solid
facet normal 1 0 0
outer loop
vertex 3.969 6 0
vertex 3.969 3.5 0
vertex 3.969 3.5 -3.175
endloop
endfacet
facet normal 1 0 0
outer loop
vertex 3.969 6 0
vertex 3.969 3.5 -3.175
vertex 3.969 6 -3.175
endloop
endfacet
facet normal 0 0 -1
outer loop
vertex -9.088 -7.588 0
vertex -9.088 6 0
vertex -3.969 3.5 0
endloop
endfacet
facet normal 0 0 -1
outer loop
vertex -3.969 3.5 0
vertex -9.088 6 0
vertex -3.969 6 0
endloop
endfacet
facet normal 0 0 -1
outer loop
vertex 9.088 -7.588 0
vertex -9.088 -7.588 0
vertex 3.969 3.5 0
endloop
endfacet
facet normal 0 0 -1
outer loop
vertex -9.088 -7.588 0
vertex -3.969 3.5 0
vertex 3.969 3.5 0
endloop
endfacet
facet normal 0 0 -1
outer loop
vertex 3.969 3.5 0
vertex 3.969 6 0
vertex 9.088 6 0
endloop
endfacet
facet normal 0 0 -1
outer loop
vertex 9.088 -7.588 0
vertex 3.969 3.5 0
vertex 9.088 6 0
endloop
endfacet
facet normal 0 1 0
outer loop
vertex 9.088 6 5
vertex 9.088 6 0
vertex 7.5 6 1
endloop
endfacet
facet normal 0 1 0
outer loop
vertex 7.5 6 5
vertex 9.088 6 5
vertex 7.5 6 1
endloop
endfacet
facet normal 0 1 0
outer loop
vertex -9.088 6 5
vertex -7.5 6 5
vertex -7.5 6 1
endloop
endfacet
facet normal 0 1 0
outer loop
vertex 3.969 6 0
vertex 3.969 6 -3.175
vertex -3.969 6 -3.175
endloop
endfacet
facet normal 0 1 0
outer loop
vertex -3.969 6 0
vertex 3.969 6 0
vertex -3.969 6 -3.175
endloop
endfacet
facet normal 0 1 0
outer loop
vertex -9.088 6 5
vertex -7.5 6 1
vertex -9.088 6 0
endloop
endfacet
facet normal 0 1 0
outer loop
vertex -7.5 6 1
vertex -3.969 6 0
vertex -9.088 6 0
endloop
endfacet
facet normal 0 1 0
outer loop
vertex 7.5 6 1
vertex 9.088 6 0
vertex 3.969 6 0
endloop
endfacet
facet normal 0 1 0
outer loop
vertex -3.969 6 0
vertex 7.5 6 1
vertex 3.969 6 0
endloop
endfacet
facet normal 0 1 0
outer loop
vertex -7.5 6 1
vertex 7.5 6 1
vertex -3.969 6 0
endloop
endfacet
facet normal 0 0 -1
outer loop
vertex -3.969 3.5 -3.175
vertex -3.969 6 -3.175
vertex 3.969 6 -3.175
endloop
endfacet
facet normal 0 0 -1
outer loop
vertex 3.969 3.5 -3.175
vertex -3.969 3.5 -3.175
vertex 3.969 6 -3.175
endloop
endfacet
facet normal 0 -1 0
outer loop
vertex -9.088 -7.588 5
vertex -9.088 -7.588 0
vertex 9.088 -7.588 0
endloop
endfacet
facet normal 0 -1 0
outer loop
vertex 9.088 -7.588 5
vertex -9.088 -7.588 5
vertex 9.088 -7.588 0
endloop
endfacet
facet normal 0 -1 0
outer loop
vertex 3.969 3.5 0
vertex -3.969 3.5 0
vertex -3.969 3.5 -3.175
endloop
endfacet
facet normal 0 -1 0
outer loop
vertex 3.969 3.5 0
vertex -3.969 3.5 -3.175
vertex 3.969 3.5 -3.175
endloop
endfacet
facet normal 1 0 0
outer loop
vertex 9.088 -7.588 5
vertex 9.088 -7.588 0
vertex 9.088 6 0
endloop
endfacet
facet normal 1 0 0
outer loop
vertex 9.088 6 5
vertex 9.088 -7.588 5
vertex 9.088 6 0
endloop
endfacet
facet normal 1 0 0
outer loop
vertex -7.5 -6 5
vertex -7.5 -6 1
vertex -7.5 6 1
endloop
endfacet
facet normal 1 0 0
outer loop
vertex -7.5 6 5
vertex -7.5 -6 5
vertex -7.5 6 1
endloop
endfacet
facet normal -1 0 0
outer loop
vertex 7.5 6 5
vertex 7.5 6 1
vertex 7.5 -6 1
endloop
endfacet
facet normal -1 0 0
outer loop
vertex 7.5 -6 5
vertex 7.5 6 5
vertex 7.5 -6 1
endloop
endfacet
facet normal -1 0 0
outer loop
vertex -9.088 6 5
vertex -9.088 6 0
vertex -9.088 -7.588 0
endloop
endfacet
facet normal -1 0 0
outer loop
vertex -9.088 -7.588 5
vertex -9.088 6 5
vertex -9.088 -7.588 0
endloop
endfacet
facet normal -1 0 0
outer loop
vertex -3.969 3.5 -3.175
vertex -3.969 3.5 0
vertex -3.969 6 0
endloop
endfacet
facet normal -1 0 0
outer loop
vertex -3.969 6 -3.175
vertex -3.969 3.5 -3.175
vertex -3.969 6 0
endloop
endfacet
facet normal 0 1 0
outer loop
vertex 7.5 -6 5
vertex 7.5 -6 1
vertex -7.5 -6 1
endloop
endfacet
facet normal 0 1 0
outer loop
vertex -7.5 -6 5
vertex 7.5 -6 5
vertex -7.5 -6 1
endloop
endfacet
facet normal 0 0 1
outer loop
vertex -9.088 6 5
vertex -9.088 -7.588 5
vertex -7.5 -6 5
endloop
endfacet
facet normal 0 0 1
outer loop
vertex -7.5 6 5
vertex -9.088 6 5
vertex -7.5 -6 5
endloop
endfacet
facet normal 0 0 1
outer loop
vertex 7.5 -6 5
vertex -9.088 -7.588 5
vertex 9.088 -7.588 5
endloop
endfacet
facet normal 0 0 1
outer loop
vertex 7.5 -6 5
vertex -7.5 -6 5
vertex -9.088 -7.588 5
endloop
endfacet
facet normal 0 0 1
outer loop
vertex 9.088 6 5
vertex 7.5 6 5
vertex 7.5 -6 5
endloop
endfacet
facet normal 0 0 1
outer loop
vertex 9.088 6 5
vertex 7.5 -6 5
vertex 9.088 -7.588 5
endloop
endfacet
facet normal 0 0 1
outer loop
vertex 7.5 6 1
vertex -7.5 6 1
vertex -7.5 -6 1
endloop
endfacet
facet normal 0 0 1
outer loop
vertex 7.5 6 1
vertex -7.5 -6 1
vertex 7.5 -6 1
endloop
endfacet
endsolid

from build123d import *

# Parameters (mm, degrees)
F1_DEPTH = 5
F0_W     = 7.9375
F0_H     = 2.5
F2_DEPTH = 1
F3_DEPTH = 3.175


with BuildPart() as f1:
    # F0 (on Top) → F1 (new body)
    with BuildSketch(Plane.XY):
        Polygon((7.5, 6), (7.5, -6), (7.5, -7.5875), (9.0875, -7.5875), (9.0875, 6), align=None)
        Polygon((7.5, -7.5875), (7.5, -6), (4.5, -6), (-7.5, -6), (-7.5, -7.5875), align=None)
        Polygon((-7.5, -7.5875), (-7.5, -6), (-7.5, 4.4125), (-7.5, 6), (-7.5875, 6), (-9.0875, 6), (-9.0875, -7.5875), align=None)
    extrude(amount=F1_DEPTH)

    # F0 (on Top) → F2 (join)
    with BuildSketch(Plane.XY):
        Polygon((7.5, -7.5875), (7.5, -6), (4.5, -6), (-7.5, -6), (-7.5, -7.5875), align=None)
        Polygon((4.5, -6), (7.5, -6), (7.5, 6), (3.96875, 6), (3.96875, 3.5), (-3.96875, 3.5), (-3.96875, 6), (-5.46875, 6), (-6, 6), (-7.5, 6), (-7.5, 4.4125), (-7.5, -6), align=None)
        Polygon((7.5, 6), (7.5, -6), (7.5, -7.5875), (9.0875, -7.5875), (9.0875, 6), align=None)
        Polygon((-7.5, -7.5875), (-7.5, -6), (-7.5, 4.4125), (-7.5, 6), (-7.5875, 6), (-9.0875, 6), (-9.0875, -7.5875), align=None)
        with Locations((0, 4.75)):
            Rectangle(F0_W, F0_H)
    extrude(amount=F2_DEPTH)

    # F0 (on Top) → F3 (join)
    with BuildSketch(Plane.XY):
        with Locations((0, 4.75)):
            Rectangle(F0_W, F0_H)
    extrude(amount=-F3_DEPTH)


solid = f1.part
